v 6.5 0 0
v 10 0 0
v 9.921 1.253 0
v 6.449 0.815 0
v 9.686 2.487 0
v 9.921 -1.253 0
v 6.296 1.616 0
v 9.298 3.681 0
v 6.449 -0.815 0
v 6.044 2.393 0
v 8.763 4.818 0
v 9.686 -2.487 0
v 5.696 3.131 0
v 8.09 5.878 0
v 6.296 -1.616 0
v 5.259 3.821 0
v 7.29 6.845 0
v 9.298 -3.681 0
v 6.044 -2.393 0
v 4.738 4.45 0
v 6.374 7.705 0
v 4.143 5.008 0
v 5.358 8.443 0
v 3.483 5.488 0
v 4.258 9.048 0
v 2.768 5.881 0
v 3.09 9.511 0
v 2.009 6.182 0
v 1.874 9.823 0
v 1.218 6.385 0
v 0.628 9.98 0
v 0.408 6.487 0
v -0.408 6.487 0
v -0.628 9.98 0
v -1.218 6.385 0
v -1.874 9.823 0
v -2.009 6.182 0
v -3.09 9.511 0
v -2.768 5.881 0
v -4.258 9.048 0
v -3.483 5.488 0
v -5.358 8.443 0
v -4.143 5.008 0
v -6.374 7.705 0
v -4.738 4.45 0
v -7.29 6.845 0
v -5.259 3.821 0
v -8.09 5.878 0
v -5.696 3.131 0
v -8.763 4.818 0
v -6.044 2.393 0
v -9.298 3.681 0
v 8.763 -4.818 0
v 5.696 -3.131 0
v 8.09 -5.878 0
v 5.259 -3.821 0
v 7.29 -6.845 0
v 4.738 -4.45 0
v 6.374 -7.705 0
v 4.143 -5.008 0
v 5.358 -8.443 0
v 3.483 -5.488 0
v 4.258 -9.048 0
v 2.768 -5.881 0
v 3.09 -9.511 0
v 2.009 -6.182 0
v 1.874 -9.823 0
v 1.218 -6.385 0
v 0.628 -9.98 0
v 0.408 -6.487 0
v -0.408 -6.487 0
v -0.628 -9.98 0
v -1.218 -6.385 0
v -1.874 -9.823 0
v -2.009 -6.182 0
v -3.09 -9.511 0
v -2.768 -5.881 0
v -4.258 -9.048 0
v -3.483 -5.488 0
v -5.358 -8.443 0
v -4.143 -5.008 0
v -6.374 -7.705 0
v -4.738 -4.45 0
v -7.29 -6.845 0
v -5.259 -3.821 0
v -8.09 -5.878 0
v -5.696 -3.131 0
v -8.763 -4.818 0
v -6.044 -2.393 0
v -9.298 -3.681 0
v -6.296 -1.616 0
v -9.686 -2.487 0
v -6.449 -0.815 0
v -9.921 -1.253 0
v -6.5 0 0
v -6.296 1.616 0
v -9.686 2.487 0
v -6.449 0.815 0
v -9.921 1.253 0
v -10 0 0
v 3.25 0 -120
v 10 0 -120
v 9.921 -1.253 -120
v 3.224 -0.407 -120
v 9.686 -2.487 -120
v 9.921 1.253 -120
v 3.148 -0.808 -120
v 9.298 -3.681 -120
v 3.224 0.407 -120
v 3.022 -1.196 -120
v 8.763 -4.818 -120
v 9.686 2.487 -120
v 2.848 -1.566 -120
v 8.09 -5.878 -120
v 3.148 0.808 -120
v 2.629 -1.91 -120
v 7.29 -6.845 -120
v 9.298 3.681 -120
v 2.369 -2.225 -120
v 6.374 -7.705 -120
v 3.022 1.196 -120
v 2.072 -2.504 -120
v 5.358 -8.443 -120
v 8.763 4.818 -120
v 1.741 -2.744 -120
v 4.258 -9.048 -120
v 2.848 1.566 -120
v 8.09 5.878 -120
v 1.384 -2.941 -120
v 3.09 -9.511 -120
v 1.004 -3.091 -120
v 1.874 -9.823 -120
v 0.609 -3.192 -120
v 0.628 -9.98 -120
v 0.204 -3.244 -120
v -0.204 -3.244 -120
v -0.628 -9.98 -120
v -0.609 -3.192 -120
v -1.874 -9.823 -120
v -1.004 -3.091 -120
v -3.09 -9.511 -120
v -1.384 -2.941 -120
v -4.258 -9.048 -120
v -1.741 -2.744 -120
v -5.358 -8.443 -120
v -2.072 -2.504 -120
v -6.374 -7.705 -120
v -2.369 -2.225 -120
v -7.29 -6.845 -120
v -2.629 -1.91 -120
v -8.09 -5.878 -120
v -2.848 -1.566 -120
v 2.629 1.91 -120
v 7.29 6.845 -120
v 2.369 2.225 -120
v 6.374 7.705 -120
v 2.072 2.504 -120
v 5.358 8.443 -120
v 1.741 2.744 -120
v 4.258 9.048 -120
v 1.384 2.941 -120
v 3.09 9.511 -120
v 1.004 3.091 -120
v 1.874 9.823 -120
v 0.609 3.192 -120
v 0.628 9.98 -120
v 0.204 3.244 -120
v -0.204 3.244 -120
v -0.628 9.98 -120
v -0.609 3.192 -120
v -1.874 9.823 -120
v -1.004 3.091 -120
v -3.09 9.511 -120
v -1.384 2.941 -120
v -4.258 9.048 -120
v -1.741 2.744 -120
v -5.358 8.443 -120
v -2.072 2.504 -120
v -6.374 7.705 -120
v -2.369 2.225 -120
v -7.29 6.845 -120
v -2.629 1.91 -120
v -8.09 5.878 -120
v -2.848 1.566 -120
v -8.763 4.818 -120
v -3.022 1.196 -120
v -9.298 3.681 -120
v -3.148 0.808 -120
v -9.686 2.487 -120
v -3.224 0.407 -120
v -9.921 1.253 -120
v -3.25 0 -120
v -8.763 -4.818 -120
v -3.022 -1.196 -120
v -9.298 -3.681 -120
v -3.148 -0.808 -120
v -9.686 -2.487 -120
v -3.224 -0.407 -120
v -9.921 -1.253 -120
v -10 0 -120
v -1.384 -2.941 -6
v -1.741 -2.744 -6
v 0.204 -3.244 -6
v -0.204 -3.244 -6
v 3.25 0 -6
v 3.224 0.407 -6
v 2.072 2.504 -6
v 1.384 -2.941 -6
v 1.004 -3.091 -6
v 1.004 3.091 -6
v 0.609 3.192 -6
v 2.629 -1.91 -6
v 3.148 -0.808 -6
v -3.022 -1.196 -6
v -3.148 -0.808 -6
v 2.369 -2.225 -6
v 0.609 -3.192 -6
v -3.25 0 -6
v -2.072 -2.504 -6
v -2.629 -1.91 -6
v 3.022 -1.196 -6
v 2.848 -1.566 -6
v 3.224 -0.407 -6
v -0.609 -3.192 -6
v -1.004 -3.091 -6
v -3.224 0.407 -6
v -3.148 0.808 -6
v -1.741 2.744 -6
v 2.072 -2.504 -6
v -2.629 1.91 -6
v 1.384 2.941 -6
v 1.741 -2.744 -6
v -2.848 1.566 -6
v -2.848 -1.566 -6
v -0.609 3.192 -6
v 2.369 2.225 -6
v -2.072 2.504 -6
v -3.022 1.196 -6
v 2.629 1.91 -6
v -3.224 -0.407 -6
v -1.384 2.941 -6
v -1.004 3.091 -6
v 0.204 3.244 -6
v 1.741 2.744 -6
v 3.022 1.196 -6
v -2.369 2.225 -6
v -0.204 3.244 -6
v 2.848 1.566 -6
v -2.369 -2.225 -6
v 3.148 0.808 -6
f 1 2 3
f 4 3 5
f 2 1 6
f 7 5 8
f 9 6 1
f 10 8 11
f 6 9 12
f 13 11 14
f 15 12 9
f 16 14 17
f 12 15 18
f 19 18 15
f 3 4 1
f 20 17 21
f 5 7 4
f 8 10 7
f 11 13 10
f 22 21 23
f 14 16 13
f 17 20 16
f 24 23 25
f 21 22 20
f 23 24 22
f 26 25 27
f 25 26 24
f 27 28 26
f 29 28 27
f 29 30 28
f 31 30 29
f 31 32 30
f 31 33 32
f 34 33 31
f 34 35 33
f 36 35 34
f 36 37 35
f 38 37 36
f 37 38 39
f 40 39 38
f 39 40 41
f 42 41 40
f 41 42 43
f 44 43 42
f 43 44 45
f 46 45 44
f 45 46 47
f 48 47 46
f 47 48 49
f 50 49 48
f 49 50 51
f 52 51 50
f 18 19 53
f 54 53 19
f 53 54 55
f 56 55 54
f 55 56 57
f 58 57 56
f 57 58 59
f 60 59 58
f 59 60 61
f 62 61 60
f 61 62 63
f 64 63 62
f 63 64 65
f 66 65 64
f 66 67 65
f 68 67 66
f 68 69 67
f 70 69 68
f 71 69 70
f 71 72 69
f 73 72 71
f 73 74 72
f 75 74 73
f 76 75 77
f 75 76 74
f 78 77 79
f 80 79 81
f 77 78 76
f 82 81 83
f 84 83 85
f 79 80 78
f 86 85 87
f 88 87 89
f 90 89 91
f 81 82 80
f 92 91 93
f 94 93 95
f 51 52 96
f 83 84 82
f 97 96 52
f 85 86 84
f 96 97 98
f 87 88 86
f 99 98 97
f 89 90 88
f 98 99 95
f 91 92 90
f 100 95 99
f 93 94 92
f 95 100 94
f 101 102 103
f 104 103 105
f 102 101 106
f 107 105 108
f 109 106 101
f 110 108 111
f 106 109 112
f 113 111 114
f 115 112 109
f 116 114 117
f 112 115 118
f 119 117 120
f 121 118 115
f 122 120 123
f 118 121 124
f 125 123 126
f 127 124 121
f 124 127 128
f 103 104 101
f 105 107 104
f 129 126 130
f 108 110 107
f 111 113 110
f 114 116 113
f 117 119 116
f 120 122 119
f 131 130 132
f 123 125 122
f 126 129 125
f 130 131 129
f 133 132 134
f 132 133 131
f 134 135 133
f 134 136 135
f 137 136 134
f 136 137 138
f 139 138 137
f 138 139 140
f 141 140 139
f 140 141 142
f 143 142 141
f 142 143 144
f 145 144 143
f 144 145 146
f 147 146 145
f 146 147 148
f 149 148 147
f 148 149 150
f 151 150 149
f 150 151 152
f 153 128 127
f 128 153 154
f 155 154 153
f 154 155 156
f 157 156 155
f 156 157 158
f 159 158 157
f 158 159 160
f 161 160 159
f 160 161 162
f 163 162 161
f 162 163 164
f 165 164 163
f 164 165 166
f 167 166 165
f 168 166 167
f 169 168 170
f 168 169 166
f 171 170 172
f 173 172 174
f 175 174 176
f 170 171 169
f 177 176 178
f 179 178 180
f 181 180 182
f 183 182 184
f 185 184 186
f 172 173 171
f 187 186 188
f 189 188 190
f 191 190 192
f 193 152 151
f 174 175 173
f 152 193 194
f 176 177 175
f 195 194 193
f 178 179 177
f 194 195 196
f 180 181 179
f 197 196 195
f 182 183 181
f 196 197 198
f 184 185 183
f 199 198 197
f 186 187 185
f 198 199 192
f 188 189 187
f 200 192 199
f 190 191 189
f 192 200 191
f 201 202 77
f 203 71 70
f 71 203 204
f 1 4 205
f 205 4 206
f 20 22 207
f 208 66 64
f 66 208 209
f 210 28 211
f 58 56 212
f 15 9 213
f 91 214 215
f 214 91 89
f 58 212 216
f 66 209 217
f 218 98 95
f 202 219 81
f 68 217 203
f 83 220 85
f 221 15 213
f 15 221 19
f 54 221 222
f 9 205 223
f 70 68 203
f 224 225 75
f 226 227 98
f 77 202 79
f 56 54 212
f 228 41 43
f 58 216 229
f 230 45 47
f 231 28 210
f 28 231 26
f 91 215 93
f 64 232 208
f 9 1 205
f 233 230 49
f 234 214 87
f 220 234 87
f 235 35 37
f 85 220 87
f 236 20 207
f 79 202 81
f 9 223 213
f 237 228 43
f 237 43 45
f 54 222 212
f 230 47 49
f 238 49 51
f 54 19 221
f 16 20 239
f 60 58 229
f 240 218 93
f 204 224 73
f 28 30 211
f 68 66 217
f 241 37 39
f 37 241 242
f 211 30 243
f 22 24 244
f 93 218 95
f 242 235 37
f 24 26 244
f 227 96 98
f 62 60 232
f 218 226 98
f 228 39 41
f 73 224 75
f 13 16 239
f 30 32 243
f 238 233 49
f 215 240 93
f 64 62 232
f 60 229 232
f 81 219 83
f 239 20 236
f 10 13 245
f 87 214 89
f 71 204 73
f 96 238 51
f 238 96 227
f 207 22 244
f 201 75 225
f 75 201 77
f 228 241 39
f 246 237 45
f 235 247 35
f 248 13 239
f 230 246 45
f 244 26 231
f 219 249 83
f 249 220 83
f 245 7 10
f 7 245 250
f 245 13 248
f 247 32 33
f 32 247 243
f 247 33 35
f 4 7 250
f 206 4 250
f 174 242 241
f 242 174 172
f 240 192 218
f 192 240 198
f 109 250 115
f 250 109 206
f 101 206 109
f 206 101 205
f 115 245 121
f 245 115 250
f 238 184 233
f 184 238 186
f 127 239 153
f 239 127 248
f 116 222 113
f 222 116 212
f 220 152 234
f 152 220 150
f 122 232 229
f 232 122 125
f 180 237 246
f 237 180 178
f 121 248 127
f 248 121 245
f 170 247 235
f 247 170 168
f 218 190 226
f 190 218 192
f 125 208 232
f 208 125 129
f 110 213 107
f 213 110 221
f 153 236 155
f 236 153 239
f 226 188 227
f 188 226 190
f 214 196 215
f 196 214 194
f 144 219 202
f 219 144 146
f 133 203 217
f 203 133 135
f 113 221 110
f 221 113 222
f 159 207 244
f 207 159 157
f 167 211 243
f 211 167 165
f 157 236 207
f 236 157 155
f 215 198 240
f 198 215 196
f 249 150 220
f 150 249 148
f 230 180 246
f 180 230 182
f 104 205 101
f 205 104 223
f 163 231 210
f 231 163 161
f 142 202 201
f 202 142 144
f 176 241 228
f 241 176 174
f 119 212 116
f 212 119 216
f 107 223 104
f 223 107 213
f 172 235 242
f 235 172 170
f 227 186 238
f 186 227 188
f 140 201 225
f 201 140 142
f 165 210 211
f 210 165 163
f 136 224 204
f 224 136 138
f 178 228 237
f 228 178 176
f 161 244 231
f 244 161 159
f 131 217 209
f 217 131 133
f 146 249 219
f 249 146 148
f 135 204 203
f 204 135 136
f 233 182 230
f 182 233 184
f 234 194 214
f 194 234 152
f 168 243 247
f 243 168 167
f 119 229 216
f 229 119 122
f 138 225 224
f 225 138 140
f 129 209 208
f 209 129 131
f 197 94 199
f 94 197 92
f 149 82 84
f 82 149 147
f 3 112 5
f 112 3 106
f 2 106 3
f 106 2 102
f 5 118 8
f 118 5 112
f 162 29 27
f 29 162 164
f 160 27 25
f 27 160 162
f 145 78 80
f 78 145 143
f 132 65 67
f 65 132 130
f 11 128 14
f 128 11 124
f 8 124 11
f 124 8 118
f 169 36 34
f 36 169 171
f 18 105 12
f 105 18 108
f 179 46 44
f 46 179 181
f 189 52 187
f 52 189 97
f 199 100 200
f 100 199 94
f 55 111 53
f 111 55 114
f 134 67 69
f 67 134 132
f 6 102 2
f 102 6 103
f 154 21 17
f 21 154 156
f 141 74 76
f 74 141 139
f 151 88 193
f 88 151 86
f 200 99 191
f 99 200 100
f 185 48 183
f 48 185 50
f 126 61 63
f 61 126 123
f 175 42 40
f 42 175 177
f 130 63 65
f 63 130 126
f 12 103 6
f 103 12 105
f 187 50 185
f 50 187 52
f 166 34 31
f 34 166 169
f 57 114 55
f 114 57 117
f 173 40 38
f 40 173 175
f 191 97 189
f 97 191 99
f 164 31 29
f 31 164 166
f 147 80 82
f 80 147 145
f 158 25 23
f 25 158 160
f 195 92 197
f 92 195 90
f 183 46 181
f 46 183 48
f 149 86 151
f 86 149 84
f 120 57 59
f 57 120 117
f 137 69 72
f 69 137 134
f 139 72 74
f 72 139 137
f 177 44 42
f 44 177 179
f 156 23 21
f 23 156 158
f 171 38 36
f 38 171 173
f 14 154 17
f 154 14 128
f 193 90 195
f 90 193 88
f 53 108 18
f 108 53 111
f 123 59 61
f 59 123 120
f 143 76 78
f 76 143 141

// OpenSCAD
$fn = 50;


difference() {
	union() {
		translate(v = [0, 0, -120.0000000000]) {
			cylinder(h = 120, r = 10.0000000000);
		}
	}
	union() {
		translate(v = [0, 0, 0]) {
			rotate(a = [0, 0, 0]) {
				difference() {
					union() {
						#translate(v = [0, 0, -120.0000000000]) {
							cylinder(h = 120, r = 2.2500000000);
						}
						#translate(v = [0, 0, -6]) {
							cylinder(h = 6, r1 = 3.2500000000, r2 = 6.5000000000);
						}
						#translate(v = [0, 0, -120.0000000000]) {
							cylinder(h = 120, r = 3.2500000000);
						}
						#translate(v = [0, 0, -120.0000000000]) {
							cylinder(h = 120, r = 2.2500000000);
						}
					}
					union();
				}
			}
		}
	}
}
